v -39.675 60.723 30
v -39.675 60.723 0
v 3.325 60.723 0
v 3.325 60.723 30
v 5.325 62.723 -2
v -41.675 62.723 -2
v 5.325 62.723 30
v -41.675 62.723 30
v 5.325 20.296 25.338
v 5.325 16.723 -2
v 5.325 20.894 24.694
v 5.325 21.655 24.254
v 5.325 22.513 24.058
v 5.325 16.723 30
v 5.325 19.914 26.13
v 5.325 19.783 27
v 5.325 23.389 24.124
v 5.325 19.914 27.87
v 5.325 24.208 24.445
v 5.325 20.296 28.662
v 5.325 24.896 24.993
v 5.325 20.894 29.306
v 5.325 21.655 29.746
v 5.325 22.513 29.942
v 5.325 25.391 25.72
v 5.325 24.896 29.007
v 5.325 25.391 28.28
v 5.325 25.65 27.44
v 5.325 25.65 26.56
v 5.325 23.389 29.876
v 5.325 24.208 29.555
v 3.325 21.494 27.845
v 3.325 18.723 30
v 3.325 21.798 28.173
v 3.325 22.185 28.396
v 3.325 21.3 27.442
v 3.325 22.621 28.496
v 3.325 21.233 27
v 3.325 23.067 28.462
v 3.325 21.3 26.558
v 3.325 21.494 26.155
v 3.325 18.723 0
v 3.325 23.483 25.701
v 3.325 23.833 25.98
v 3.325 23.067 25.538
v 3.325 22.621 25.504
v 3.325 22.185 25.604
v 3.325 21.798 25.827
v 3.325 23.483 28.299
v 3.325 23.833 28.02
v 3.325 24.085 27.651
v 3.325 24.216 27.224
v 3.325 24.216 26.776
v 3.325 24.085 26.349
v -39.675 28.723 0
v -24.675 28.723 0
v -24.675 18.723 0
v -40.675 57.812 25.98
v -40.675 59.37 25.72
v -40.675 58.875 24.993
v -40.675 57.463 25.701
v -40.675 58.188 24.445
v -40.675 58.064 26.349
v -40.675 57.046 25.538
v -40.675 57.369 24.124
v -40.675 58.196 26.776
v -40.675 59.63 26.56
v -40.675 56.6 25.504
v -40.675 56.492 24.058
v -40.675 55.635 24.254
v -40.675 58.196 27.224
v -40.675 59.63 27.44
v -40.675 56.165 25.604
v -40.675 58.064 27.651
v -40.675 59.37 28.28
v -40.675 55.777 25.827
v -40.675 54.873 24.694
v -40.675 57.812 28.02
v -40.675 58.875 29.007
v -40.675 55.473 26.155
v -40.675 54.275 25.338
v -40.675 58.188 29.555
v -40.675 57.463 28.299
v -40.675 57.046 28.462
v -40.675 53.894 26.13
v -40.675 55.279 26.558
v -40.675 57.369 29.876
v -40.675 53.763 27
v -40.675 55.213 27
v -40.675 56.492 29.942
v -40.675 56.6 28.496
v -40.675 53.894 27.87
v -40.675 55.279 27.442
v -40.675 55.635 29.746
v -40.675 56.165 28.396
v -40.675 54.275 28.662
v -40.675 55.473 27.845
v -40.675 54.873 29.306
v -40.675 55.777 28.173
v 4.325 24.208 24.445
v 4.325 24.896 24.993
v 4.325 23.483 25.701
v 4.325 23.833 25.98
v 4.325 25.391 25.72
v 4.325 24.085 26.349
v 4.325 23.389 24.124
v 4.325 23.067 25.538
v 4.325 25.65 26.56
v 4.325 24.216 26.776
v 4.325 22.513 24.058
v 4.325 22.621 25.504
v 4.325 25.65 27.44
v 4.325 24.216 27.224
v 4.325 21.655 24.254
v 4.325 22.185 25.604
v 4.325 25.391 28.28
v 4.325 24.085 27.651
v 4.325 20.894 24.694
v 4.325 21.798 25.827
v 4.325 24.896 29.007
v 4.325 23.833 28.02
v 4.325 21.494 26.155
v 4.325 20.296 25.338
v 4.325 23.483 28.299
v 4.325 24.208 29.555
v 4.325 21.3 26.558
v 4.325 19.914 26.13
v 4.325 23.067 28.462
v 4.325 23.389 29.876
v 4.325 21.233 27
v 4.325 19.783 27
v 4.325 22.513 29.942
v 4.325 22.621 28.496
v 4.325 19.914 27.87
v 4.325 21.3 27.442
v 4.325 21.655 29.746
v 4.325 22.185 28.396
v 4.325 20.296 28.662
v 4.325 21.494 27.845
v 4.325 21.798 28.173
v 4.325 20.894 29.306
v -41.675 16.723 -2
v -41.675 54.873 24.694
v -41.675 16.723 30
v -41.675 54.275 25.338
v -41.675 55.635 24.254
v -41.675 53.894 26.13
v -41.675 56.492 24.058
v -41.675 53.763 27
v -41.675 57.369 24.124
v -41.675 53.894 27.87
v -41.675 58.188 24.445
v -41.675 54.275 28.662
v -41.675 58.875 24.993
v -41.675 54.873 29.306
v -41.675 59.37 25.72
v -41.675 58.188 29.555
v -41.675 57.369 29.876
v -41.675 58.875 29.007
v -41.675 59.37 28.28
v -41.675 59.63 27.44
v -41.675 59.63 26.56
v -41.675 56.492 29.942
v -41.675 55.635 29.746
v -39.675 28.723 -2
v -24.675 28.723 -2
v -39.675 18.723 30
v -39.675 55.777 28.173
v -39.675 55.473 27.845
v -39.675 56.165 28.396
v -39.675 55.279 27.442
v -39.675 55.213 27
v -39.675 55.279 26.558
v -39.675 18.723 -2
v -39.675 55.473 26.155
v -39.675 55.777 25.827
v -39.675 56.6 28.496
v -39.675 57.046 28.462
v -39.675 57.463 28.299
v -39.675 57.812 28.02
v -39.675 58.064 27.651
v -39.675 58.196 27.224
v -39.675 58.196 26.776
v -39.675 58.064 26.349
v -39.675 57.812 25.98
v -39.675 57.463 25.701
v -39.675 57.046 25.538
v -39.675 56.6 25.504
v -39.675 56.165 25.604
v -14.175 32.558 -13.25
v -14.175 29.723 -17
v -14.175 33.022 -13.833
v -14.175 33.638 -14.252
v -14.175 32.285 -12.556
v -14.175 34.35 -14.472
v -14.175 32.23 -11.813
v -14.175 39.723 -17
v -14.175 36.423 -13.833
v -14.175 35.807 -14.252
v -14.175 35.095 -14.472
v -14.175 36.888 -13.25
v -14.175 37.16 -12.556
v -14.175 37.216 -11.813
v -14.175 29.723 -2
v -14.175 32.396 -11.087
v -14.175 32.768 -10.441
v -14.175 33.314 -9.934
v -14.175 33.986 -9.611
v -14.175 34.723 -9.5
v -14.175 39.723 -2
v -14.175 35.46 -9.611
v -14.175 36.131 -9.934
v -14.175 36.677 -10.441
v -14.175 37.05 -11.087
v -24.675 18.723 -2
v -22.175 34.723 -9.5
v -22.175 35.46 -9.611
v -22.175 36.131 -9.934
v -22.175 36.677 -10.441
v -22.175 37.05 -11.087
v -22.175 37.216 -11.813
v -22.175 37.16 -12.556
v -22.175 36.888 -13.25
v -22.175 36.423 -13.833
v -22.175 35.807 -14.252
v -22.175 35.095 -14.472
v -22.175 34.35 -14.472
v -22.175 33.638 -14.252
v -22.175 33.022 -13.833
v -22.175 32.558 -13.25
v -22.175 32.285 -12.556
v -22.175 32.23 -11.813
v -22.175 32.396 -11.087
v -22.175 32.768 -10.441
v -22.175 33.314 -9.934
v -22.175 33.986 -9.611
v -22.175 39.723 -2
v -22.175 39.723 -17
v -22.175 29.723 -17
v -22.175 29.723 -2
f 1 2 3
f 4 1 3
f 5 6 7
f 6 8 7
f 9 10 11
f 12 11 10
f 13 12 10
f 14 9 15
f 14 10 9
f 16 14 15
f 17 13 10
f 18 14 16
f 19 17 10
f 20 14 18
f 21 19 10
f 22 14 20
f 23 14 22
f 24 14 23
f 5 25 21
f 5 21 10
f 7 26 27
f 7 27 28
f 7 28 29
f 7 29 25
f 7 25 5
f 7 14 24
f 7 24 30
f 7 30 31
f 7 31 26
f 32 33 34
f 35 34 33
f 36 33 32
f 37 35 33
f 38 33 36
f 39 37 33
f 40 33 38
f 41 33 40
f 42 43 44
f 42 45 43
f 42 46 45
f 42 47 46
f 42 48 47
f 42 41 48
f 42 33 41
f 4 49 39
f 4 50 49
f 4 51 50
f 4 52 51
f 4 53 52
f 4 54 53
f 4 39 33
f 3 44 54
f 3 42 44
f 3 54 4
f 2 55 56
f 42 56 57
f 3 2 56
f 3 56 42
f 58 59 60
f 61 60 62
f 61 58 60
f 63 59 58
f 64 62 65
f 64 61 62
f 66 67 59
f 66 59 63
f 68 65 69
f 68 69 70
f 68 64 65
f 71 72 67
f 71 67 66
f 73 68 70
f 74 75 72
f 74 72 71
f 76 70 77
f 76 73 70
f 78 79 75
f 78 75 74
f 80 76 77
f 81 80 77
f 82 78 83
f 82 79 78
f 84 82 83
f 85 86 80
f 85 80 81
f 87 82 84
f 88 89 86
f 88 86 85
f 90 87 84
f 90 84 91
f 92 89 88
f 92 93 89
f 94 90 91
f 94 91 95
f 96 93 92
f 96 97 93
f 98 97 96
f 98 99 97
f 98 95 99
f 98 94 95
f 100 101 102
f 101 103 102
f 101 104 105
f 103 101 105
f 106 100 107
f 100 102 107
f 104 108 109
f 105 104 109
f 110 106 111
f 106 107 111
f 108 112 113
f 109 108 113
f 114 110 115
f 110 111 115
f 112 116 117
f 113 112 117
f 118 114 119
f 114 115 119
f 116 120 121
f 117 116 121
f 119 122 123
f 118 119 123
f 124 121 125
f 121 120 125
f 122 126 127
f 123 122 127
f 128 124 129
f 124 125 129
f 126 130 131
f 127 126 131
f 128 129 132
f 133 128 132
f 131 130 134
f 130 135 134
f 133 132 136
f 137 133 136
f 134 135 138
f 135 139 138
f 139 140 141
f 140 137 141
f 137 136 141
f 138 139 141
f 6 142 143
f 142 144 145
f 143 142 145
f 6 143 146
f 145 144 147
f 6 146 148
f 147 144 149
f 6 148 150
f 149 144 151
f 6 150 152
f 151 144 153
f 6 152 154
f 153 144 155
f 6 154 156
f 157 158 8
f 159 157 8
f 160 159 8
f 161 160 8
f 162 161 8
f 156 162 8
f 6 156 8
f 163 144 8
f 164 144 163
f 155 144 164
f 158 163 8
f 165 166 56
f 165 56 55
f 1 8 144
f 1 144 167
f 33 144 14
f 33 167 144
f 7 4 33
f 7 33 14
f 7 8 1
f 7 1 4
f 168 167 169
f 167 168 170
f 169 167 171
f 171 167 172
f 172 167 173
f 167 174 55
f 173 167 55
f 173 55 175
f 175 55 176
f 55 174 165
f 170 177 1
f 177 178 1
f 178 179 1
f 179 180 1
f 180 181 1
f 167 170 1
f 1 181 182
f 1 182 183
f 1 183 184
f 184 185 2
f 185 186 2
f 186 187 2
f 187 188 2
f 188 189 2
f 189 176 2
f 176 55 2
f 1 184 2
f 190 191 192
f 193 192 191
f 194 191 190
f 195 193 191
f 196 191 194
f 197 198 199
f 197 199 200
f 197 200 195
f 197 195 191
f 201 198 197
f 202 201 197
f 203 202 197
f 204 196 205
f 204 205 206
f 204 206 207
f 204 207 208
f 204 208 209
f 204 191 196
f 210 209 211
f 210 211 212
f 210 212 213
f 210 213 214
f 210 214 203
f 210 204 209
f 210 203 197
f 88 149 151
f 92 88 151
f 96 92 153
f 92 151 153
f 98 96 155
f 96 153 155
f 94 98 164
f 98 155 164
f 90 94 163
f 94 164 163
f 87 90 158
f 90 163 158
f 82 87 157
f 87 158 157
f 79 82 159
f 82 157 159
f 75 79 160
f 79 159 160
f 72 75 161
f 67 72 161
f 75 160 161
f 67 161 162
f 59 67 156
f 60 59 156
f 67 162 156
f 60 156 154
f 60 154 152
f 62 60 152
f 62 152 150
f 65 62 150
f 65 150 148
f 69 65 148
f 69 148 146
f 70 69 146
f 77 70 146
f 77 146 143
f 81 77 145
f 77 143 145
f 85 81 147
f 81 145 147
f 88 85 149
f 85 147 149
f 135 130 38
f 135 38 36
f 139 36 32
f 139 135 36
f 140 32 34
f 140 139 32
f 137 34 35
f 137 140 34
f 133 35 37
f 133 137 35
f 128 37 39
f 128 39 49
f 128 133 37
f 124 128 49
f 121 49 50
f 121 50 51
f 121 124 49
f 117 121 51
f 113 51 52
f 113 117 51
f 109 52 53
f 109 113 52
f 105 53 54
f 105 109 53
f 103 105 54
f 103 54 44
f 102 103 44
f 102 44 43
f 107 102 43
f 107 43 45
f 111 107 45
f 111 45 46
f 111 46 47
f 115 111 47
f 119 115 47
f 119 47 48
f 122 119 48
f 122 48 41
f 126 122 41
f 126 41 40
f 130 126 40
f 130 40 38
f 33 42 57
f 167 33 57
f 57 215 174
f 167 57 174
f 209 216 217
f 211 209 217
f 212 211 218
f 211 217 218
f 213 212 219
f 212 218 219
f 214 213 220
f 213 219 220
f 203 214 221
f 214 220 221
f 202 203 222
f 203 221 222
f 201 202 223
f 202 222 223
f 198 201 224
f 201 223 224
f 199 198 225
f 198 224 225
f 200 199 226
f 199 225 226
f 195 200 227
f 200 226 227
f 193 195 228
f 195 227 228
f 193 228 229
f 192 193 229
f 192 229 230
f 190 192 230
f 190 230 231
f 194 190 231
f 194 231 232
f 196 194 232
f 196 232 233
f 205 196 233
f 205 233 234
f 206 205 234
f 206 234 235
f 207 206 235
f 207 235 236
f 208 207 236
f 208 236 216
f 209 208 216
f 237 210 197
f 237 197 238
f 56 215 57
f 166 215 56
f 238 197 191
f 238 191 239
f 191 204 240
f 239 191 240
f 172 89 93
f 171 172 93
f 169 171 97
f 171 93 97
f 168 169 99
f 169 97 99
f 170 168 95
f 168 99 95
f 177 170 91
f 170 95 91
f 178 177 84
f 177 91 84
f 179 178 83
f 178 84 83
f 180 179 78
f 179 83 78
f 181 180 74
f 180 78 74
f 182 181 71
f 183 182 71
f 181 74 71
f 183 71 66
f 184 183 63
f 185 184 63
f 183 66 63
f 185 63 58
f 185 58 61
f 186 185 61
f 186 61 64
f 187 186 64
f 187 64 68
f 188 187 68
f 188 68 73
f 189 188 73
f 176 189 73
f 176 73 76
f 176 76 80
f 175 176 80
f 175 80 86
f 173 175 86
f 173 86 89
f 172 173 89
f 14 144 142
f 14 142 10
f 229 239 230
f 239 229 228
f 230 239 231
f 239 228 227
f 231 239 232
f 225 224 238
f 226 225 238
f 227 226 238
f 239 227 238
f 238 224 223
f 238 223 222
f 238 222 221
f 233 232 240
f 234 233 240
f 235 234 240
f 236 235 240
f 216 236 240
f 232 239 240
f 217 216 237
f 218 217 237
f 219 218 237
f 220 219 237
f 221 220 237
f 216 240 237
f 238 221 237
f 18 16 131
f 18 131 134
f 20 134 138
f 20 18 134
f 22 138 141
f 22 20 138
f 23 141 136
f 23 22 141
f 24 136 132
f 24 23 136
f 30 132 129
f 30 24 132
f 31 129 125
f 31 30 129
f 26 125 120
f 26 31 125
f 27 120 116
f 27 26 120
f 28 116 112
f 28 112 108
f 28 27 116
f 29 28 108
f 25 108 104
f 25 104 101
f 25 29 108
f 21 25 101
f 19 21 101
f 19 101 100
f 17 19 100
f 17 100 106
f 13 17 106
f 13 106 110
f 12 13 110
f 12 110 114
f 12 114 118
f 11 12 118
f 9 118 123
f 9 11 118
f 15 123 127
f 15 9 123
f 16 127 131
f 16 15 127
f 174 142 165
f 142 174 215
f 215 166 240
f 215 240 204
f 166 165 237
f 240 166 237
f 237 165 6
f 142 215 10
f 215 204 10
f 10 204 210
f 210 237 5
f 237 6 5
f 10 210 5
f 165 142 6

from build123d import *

# Parameters (mm, degrees)
SKETCH1_W         = 47
SKETCH1_H         = 46
SKETCH1_W_2       = 43
SKETCH1_H_2       = 42
WALLS_DEPTH       = 30
SKETCH1_2_W       = 47
SKETCH1_2_H       = 46
SKETCH1_2_W_2     = 43
SKETCH1_2_H_2     = 42
BACK_DEPTH        = 2
SKETCH2_W         = 15
SKETCH2_H         = 10
CABLE_DEPTH       = 2
SKETCH3_R         = 1.5
SETSCREW1_DEPTH   = 2
SKETCH3_6_R       = 2.95
SKETCH3_6_R_2     = 1.5
SETSCREW2_DEPTH   = 1
SETSCREW3_START   = -47
SKETCH3_7_R       = 2.95
SKETCH3_7_R_2     = 1.5
SETSCREW3_DEPTH   = 1
SETSCREW4_START   = -47
SKETCH3_8_R       = 1.5
SETSCREW4_DEPTH   = 2
SKETCH4_W         = 8
SKETCH4_H         = 10
MOUNT_JOINT_DEPTH = 15
SKETCH6_R         = 2.5
JOINT_DEPTH       = 10


with BuildPart() as part:
    # Sketch1 → Walls (new body)
    with BuildSketch(Plane.XY):
        with Locations((-18.175400489, 39.722790127)):
            Rectangle(SKETCH1_W, SKETCH1_H)
        with Locations((-18.175400489, 39.722790127)):
            Rectangle(SKETCH1_W_2, SKETCH1_H_2, mode=Mode.SUBTRACT)
    extrude(amount=WALLS_DEPTH)

    # Sketch1<2> → Back (add)
    # profile 1 of 2: a face of its own
    with BuildSketch(Plane.XY):
        with Locations((-18.175400489, 39.722790127)):
            Rectangle(SKETCH1_2_W, SKETCH1_2_H)
        with Locations((-18.175400489, 39.722790127)):
            Rectangle(SKETCH1_2_W_2, SKETCH1_2_H_2, mode=Mode.SUBTRACT)
    # profile 2 of 2: a face of its own
    with BuildSketch(Plane.XY):
        with Locations((-18.175400489, 39.722790127)):
            Rectangle(SKETCH1_2_W_2, SKETCH1_2_H_2)
    extrude(amount=-BACK_DEPTH)

    # Sketch2 → Cable (cut)
    with BuildSketch(Plane(origin=(0, 0, -2), x_dir=(-1, 0, 0), z_dir=(0, 0, -1))):
        with Locations((32.175400489, 23.722790127)):
            Rectangle(SKETCH2_W, SKETCH2_H)
    extrude(amount=-CABLE_DEPTH, mode=Mode.SUBTRACT)

    # Sketch3 → SetScrew1 (cut)
    with BuildSketch(Plane.ZY.offset(41.675400489)):
        with Locations(Location((27, 56.712532563, 0), (0, 0, 270))):
            Circle(SKETCH3_R)
    extrude(amount=-SETSCREW1_DEPTH, mode=Mode.SUBTRACT)

    # Sketch3<6> → SetScrew2 (cut)
    with BuildSketch(Plane.ZY.offset(41.675400489)):
        with Locations(Location((27, 56.712532563, 0), (0, 0, 270))):
            Circle(SKETCH3_6_R)
        with Locations(Location((27, 56.712532563, 0), (0, 0, 270))):
            Circle(SKETCH3_6_R_2, mode=Mode.SUBTRACT)
    extrude(amount=-SETSCREW2_DEPTH, mode=Mode.SUBTRACT)

    # Sketch3<7> → SetScrew3 (cut)
    with BuildSketch(Plane.ZY.offset(41.675400489).offset(SETSCREW3_START)):
        with Locations(Location((27, 22.733047692, 0), (0, 0, 270))):
            Circle(SKETCH3_7_R)
        with Locations(Location((27, 22.733047692, 0), (0, 0, 270))):
            Circle(SKETCH3_7_R_2, mode=Mode.SUBTRACT)
    extrude(amount=SETSCREW3_DEPTH, mode=Mode.SUBTRACT)

    # Sketch3<8> → SetScrew4 (cut)
    with BuildSketch(Plane.ZY.offset(41.675400489).offset(SETSCREW4_START)):
        with Locations(Location((27, 22.733047692, 0), (0, 0, 270))):
            Circle(SKETCH3_8_R)
    extrude(amount=SETSCREW4_DEPTH, mode=Mode.SUBTRACT)

    # Sketch4 → Mount Joint (add)
    with BuildSketch(Plane(origin=(0, 0, -2), x_dir=(-1, 0, 0), z_dir=(0, 0, -1))):
        with Locations((18.175400489, 34.722790127)):
            Rectangle(SKETCH4_W, SKETCH4_H)
    extrude(amount=MOUNT_JOINT_DEPTH)

    # Sketch6 → Joint (cut)
    with BuildSketch(Plane.ZY.offset(22.175400489)):
        with Locations((-12, 34.722790127)):
            Circle(SKETCH6_R)
    extrude(amount=-JOINT_DEPTH, mode=Mode.SUBTRACT)


solid = part.part
